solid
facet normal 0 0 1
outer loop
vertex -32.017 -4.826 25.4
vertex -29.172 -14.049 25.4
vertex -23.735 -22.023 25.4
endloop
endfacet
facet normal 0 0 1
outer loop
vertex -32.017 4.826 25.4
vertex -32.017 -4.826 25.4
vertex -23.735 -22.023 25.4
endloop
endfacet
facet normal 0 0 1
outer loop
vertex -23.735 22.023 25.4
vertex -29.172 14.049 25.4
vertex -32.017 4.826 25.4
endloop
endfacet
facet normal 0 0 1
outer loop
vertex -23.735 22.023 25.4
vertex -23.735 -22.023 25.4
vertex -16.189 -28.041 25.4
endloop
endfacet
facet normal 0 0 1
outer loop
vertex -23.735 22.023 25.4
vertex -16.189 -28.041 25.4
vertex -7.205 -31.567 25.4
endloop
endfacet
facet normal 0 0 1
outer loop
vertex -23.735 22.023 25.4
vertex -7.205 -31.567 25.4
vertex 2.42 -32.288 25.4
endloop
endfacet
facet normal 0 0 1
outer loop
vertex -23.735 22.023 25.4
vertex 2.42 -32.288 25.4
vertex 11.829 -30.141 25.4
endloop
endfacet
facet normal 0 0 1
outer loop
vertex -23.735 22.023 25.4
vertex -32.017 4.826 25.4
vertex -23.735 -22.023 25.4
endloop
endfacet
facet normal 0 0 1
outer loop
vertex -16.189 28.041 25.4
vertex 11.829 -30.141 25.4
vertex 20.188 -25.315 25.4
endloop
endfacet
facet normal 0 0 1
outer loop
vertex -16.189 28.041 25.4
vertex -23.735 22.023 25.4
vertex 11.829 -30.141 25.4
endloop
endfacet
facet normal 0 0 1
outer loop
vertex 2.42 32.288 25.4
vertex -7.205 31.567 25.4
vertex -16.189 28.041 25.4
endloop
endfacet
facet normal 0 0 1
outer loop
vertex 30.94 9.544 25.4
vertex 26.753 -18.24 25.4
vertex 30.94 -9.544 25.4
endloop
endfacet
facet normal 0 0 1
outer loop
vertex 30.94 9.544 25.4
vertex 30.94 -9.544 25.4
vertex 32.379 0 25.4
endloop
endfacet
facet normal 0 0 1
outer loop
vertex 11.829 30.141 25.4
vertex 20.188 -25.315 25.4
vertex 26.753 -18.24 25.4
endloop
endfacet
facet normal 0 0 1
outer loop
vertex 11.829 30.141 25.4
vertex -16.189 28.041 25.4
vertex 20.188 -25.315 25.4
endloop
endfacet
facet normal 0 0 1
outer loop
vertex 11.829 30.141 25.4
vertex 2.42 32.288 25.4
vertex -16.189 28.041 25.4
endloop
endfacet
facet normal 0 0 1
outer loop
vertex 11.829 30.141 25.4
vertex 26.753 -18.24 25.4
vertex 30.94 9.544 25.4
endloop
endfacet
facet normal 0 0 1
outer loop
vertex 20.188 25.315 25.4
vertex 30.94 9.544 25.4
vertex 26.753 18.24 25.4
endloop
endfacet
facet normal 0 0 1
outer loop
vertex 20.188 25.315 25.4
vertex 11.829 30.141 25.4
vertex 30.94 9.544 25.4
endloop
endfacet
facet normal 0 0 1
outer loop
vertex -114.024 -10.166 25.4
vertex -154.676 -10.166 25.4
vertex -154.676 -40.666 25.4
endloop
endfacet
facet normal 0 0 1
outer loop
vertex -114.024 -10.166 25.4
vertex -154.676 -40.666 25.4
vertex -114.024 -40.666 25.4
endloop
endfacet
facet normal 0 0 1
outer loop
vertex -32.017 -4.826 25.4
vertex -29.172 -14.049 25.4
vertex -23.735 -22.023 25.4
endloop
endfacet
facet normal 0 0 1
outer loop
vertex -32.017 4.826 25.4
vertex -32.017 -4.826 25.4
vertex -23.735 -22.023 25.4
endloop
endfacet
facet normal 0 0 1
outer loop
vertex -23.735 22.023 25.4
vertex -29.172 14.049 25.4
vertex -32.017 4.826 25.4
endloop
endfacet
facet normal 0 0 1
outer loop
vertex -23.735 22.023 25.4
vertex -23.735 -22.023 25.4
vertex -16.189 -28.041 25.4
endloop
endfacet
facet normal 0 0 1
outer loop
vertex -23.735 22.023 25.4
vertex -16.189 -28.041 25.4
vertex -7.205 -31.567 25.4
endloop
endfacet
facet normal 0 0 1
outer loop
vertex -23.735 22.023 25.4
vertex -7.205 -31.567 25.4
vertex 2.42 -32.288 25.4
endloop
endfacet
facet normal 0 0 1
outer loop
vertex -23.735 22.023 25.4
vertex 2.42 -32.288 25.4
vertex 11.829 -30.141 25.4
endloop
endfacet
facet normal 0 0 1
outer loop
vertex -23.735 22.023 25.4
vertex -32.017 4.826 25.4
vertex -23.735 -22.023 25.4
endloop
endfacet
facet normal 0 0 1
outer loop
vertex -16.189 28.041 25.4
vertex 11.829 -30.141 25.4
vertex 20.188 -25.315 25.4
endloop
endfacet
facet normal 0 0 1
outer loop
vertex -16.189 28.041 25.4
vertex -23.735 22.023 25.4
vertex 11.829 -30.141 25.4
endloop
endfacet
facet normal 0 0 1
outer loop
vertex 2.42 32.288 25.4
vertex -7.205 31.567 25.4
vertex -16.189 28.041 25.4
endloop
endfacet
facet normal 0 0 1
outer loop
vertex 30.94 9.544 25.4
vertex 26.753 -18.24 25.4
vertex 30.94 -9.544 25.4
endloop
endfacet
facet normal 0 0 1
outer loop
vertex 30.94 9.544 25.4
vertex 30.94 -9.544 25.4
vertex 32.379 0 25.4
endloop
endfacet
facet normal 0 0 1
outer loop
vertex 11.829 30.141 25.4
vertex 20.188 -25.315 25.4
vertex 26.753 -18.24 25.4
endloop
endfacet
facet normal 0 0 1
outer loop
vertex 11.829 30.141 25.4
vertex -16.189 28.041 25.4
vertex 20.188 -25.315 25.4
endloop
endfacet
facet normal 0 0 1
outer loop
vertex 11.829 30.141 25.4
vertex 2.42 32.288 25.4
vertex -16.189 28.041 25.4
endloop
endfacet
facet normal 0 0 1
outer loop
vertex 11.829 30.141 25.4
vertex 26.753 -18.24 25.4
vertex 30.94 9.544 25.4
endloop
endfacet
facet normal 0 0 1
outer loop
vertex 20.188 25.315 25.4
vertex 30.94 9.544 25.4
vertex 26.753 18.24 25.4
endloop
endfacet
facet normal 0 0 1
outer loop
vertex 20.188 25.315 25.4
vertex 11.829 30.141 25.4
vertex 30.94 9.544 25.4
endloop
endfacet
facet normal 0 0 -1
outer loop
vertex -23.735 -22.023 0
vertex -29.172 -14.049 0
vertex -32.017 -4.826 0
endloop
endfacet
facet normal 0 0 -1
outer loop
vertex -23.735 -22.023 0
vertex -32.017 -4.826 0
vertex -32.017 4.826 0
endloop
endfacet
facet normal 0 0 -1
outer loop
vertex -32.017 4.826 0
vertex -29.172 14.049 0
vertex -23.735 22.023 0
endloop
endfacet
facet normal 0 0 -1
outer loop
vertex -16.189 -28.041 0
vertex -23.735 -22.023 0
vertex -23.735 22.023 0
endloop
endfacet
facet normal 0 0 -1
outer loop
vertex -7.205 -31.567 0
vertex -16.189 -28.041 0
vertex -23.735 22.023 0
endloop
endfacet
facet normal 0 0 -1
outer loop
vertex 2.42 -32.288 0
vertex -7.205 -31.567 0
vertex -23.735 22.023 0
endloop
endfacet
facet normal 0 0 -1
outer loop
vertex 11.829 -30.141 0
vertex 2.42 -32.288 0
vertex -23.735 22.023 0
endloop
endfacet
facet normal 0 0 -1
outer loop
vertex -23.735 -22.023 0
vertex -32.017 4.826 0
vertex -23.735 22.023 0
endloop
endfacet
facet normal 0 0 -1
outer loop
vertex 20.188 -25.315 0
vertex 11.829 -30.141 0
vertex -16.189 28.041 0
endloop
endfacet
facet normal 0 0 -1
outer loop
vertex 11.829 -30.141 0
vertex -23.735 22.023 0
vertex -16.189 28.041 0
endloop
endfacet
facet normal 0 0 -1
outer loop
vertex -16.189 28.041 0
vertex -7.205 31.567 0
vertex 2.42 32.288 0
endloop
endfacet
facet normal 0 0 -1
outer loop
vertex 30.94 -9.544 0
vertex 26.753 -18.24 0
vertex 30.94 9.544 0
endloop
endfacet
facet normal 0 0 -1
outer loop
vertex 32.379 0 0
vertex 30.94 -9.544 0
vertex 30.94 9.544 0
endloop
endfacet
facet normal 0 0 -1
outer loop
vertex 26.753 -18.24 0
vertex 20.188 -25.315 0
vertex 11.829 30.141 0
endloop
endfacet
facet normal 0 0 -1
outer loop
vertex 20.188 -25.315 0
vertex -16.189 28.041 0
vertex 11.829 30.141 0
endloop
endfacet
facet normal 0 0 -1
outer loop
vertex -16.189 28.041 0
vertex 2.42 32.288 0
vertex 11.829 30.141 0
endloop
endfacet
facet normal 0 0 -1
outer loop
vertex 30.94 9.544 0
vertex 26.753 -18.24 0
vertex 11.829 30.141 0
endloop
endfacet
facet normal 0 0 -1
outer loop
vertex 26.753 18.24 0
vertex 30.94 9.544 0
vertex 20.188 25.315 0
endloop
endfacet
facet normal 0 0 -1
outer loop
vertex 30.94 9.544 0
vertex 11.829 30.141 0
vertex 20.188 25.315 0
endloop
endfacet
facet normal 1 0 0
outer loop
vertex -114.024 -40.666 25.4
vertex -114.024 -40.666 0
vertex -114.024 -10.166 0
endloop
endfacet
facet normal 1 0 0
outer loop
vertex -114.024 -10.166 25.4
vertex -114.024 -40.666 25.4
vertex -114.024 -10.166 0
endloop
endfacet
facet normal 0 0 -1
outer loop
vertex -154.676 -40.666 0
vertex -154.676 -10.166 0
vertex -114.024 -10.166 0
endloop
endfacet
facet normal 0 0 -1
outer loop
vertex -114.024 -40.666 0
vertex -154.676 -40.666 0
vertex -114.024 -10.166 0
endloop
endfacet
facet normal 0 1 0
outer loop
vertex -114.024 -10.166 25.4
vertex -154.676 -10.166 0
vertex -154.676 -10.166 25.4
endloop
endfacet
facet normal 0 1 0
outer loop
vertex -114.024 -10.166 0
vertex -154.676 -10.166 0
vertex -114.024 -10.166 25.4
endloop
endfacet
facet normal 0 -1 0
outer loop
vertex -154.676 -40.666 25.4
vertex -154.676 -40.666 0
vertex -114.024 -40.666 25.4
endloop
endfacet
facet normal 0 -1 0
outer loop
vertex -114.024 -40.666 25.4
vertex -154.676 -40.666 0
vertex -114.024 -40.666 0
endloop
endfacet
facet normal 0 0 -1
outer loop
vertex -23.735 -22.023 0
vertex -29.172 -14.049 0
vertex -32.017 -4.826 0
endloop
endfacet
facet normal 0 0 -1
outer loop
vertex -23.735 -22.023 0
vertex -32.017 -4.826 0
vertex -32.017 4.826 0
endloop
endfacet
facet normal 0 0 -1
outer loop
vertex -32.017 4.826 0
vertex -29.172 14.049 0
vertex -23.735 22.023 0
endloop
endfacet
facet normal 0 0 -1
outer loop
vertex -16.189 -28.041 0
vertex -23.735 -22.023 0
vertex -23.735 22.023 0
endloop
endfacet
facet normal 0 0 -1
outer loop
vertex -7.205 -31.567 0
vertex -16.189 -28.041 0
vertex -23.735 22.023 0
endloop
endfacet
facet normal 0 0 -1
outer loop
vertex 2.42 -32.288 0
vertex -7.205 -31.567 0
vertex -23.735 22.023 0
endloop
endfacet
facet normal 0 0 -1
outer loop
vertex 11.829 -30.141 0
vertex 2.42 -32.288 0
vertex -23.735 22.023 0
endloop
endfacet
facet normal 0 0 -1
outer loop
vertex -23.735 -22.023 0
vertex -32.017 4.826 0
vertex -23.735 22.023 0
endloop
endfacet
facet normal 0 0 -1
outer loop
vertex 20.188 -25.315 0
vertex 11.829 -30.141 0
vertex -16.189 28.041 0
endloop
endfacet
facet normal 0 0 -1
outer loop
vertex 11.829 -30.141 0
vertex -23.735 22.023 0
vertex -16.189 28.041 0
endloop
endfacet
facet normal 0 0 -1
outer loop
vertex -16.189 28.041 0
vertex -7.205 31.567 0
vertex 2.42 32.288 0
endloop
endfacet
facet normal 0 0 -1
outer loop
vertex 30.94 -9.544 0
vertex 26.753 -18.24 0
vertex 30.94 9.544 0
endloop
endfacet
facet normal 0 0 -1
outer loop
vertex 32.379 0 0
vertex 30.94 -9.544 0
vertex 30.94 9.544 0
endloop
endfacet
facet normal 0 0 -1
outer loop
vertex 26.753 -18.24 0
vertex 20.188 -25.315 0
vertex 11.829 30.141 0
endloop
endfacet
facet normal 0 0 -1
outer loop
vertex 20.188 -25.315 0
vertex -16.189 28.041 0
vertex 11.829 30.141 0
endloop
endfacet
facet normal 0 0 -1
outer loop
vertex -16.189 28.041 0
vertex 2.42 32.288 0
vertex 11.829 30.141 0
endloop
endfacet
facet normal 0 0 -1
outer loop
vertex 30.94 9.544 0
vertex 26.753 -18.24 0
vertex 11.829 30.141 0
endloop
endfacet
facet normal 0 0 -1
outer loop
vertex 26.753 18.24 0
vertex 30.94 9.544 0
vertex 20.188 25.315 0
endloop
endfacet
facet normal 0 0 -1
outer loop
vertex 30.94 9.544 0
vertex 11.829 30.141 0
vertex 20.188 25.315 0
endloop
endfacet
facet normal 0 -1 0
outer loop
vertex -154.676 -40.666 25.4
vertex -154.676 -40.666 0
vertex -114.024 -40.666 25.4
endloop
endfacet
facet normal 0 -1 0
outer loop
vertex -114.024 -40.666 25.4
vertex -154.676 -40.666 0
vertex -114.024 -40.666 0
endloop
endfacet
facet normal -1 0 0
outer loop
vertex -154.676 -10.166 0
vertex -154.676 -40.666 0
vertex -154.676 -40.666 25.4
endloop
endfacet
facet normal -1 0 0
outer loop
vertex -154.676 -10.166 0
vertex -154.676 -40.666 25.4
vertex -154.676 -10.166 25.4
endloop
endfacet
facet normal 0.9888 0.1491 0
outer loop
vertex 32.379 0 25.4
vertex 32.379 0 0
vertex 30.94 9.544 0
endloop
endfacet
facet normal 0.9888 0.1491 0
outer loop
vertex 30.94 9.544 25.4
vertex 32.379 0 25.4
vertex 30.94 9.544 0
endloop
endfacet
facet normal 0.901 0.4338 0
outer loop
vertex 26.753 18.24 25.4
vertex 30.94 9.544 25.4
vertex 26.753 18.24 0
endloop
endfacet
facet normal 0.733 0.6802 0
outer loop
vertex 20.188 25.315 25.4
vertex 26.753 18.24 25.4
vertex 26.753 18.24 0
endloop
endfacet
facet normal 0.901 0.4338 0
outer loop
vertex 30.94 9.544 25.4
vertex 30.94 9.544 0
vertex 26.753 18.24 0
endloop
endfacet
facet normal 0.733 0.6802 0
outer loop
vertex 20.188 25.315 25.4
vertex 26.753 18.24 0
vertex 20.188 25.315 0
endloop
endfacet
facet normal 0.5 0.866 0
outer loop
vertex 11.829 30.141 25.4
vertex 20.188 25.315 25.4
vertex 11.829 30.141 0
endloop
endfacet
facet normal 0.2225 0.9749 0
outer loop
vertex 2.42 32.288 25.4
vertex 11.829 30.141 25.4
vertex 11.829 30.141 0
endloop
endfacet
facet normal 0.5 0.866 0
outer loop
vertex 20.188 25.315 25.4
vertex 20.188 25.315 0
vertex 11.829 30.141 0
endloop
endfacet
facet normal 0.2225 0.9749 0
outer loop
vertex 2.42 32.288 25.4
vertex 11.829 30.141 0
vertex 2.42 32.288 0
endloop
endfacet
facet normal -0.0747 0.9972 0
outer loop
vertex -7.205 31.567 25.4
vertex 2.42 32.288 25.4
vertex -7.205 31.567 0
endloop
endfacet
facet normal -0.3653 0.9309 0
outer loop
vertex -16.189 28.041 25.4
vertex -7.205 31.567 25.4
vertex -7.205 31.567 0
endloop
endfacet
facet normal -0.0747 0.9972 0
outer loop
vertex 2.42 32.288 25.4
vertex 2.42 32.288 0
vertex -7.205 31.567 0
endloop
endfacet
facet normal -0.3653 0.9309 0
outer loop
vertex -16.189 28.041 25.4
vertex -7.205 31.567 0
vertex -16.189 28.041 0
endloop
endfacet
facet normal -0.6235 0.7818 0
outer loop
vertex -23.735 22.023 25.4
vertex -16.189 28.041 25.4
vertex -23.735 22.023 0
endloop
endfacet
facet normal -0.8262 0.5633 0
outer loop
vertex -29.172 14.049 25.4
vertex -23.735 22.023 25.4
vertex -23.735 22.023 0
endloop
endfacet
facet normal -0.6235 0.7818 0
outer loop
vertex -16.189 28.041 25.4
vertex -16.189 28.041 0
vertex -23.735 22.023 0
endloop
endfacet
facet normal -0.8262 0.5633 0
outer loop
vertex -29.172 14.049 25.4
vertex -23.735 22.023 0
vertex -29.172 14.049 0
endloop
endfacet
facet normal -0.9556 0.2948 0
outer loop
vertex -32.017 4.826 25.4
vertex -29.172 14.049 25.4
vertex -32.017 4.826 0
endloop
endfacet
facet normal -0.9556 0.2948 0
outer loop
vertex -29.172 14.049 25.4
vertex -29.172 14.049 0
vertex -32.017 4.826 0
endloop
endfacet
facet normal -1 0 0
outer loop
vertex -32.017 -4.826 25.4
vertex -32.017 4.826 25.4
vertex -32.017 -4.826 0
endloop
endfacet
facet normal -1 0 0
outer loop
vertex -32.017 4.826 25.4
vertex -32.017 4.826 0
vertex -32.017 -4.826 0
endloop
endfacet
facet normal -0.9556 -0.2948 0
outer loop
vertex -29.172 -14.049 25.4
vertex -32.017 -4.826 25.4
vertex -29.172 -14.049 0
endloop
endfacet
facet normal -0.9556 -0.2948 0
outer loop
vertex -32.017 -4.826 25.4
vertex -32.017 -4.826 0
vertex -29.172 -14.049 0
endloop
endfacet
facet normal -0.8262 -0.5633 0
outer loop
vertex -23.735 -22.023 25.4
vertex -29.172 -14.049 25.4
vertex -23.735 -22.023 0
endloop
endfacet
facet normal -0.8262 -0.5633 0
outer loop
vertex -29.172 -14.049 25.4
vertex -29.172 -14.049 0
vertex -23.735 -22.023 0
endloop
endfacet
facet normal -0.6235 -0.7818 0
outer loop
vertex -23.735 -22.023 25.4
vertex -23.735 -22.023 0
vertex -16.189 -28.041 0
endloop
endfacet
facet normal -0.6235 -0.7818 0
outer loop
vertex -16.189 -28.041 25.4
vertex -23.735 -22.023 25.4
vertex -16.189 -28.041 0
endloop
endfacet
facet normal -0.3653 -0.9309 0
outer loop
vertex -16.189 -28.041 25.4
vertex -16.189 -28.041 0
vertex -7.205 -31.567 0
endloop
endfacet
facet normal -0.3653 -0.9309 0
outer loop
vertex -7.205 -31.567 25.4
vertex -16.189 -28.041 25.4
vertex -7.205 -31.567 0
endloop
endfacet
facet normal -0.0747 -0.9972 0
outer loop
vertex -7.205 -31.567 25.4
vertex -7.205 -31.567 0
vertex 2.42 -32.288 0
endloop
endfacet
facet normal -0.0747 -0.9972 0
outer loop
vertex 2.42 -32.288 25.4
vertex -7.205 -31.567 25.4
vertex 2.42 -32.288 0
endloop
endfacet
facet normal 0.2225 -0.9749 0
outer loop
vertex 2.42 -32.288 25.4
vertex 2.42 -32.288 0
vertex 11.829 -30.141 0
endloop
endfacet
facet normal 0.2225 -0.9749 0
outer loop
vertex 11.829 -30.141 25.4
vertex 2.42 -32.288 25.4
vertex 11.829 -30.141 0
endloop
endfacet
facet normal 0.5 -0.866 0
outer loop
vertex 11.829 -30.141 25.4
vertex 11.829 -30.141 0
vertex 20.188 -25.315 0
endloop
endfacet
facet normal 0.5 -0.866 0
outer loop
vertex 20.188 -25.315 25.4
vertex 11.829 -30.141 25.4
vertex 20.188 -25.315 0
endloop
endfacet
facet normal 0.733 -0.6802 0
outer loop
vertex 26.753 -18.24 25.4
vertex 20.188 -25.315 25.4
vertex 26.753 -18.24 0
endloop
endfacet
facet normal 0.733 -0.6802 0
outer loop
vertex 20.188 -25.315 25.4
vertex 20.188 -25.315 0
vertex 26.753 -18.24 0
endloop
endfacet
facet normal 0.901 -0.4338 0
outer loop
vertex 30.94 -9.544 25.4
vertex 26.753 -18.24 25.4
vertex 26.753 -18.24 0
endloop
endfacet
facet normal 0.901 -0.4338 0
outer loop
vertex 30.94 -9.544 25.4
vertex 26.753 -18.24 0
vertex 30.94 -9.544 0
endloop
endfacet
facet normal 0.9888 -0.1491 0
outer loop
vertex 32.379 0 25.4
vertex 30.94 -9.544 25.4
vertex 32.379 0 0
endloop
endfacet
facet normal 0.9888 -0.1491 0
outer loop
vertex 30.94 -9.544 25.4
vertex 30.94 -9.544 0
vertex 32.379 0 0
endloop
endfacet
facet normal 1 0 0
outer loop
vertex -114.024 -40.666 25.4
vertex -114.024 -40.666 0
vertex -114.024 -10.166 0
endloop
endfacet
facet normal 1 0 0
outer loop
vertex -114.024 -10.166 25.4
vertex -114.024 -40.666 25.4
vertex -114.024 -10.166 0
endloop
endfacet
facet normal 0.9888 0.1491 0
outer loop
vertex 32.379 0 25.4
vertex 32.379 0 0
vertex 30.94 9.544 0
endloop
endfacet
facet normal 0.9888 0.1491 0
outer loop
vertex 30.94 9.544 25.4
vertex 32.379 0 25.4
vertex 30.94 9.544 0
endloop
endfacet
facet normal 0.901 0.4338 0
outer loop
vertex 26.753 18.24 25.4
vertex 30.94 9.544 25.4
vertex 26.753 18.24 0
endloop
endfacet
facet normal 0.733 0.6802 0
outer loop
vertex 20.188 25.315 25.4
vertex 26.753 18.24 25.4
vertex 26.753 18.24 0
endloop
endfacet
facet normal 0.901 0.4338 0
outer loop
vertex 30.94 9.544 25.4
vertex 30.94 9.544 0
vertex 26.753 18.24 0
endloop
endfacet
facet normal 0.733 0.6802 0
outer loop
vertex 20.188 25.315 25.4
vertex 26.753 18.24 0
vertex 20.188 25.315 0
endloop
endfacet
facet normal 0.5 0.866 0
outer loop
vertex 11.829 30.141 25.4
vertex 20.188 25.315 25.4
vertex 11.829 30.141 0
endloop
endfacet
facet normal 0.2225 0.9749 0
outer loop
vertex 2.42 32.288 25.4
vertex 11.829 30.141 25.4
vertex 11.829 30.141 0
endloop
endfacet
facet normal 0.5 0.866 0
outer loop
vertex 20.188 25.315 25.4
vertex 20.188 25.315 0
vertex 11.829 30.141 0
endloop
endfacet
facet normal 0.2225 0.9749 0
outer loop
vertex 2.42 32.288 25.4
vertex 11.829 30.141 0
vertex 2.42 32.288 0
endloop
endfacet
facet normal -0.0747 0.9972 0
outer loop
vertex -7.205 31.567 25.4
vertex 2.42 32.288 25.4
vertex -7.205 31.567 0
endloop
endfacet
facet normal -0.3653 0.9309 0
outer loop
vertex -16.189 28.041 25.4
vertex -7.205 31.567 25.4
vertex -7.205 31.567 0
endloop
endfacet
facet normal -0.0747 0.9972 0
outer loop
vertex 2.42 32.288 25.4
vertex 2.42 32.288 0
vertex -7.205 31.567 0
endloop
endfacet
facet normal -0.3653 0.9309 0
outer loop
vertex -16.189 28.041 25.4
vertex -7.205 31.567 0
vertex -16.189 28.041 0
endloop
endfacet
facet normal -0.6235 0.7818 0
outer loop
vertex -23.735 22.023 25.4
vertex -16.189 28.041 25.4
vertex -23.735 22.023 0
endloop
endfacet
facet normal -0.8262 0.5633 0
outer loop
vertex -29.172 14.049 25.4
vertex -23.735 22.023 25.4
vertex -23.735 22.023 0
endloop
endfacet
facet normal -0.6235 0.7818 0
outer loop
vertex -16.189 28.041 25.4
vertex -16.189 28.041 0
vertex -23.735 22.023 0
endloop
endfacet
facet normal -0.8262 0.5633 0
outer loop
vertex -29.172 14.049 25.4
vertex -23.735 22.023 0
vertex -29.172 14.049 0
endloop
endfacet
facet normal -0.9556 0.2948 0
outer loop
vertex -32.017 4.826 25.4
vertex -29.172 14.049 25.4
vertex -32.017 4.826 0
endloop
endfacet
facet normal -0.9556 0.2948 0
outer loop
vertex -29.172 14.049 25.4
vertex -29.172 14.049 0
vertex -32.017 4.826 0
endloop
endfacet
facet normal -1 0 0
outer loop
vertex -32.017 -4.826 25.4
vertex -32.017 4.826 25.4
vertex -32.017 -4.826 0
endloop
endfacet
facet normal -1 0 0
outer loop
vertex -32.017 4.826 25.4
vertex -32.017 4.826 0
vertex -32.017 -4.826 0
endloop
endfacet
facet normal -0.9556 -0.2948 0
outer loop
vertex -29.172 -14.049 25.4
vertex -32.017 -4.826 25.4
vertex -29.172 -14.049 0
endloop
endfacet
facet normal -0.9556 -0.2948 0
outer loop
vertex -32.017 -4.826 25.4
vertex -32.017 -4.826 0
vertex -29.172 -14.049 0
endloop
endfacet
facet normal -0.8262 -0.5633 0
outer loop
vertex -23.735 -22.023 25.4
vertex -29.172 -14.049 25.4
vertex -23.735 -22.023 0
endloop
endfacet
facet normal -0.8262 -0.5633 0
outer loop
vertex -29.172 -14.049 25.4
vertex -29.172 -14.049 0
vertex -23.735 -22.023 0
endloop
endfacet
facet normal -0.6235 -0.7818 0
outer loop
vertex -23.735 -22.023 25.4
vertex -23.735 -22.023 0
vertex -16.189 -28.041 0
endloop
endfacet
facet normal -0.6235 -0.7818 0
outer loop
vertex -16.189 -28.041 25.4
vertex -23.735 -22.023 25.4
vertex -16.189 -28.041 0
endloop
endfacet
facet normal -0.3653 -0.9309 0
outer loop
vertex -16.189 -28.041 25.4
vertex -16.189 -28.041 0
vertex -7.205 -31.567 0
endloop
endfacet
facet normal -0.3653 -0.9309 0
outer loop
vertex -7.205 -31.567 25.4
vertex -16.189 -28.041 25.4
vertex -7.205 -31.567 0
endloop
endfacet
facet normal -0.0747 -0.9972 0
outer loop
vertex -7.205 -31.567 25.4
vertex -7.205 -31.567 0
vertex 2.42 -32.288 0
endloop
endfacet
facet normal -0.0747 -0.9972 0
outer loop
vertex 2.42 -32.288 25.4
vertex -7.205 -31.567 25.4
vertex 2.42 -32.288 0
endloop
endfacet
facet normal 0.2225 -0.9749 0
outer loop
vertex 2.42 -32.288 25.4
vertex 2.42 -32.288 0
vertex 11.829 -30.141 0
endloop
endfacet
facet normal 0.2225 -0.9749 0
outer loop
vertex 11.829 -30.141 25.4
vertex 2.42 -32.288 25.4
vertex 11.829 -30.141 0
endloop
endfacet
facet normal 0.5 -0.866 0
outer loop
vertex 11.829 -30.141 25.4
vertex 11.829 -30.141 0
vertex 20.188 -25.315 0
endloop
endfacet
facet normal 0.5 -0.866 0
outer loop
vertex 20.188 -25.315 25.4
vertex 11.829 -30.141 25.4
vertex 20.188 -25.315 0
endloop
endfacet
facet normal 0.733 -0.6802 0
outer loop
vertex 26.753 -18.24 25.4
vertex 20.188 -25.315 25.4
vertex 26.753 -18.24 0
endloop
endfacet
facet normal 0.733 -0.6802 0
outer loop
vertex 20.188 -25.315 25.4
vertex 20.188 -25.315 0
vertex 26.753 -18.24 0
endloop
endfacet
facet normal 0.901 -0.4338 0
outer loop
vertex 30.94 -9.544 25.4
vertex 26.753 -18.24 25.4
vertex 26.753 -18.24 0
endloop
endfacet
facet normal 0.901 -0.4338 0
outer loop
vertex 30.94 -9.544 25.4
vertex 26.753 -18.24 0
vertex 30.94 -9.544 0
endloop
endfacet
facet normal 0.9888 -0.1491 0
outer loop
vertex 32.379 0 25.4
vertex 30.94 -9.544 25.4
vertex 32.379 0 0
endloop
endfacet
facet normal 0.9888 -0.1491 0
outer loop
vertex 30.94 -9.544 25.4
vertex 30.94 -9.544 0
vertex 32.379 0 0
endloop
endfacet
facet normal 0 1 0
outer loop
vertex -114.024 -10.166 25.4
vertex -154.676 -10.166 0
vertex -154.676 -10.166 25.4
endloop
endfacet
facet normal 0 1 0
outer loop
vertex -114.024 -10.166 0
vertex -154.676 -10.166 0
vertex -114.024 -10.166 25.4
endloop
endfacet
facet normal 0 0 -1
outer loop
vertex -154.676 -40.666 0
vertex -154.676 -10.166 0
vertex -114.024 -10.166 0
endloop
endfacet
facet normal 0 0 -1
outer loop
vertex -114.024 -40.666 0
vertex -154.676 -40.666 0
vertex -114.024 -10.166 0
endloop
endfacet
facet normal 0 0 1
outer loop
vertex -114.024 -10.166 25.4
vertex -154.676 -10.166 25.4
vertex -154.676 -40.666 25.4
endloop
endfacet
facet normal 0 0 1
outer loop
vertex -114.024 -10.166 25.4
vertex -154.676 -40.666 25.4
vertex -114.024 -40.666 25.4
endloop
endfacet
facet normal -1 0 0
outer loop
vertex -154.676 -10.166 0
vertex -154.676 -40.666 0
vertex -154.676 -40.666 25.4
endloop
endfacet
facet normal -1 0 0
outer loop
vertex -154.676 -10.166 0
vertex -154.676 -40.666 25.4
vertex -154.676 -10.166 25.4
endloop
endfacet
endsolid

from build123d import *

# Parameters (mm, degrees)
F0_R     = 32.378828
F0_W     = 40.652342
F0_H     = 30.499519
F1_DEPTH = 25.4
F2_DEPTH = 25.4


with BuildPart() as f1:
    # F0 (on Top) → F1 (new body)
    with BuildSketch(Plane.XY):
        Circle(F0_R)
        with Locations((-134.350296, -25.416235)):
            Rectangle(F0_W, F0_H)
    extrude(amount=F1_DEPTH)


with BuildPart() as f2:
    # F0 (on Top) → F2 (new body)
    with BuildSketch(Plane.XY):
        Circle(F0_R)
        with Locations((-134.350296, -25.416235)):
            Rectangle(F0_W, F0_H)
    extrude(amount=F2_DEPTH)


solid = Compound([f1.part, f2.part])
